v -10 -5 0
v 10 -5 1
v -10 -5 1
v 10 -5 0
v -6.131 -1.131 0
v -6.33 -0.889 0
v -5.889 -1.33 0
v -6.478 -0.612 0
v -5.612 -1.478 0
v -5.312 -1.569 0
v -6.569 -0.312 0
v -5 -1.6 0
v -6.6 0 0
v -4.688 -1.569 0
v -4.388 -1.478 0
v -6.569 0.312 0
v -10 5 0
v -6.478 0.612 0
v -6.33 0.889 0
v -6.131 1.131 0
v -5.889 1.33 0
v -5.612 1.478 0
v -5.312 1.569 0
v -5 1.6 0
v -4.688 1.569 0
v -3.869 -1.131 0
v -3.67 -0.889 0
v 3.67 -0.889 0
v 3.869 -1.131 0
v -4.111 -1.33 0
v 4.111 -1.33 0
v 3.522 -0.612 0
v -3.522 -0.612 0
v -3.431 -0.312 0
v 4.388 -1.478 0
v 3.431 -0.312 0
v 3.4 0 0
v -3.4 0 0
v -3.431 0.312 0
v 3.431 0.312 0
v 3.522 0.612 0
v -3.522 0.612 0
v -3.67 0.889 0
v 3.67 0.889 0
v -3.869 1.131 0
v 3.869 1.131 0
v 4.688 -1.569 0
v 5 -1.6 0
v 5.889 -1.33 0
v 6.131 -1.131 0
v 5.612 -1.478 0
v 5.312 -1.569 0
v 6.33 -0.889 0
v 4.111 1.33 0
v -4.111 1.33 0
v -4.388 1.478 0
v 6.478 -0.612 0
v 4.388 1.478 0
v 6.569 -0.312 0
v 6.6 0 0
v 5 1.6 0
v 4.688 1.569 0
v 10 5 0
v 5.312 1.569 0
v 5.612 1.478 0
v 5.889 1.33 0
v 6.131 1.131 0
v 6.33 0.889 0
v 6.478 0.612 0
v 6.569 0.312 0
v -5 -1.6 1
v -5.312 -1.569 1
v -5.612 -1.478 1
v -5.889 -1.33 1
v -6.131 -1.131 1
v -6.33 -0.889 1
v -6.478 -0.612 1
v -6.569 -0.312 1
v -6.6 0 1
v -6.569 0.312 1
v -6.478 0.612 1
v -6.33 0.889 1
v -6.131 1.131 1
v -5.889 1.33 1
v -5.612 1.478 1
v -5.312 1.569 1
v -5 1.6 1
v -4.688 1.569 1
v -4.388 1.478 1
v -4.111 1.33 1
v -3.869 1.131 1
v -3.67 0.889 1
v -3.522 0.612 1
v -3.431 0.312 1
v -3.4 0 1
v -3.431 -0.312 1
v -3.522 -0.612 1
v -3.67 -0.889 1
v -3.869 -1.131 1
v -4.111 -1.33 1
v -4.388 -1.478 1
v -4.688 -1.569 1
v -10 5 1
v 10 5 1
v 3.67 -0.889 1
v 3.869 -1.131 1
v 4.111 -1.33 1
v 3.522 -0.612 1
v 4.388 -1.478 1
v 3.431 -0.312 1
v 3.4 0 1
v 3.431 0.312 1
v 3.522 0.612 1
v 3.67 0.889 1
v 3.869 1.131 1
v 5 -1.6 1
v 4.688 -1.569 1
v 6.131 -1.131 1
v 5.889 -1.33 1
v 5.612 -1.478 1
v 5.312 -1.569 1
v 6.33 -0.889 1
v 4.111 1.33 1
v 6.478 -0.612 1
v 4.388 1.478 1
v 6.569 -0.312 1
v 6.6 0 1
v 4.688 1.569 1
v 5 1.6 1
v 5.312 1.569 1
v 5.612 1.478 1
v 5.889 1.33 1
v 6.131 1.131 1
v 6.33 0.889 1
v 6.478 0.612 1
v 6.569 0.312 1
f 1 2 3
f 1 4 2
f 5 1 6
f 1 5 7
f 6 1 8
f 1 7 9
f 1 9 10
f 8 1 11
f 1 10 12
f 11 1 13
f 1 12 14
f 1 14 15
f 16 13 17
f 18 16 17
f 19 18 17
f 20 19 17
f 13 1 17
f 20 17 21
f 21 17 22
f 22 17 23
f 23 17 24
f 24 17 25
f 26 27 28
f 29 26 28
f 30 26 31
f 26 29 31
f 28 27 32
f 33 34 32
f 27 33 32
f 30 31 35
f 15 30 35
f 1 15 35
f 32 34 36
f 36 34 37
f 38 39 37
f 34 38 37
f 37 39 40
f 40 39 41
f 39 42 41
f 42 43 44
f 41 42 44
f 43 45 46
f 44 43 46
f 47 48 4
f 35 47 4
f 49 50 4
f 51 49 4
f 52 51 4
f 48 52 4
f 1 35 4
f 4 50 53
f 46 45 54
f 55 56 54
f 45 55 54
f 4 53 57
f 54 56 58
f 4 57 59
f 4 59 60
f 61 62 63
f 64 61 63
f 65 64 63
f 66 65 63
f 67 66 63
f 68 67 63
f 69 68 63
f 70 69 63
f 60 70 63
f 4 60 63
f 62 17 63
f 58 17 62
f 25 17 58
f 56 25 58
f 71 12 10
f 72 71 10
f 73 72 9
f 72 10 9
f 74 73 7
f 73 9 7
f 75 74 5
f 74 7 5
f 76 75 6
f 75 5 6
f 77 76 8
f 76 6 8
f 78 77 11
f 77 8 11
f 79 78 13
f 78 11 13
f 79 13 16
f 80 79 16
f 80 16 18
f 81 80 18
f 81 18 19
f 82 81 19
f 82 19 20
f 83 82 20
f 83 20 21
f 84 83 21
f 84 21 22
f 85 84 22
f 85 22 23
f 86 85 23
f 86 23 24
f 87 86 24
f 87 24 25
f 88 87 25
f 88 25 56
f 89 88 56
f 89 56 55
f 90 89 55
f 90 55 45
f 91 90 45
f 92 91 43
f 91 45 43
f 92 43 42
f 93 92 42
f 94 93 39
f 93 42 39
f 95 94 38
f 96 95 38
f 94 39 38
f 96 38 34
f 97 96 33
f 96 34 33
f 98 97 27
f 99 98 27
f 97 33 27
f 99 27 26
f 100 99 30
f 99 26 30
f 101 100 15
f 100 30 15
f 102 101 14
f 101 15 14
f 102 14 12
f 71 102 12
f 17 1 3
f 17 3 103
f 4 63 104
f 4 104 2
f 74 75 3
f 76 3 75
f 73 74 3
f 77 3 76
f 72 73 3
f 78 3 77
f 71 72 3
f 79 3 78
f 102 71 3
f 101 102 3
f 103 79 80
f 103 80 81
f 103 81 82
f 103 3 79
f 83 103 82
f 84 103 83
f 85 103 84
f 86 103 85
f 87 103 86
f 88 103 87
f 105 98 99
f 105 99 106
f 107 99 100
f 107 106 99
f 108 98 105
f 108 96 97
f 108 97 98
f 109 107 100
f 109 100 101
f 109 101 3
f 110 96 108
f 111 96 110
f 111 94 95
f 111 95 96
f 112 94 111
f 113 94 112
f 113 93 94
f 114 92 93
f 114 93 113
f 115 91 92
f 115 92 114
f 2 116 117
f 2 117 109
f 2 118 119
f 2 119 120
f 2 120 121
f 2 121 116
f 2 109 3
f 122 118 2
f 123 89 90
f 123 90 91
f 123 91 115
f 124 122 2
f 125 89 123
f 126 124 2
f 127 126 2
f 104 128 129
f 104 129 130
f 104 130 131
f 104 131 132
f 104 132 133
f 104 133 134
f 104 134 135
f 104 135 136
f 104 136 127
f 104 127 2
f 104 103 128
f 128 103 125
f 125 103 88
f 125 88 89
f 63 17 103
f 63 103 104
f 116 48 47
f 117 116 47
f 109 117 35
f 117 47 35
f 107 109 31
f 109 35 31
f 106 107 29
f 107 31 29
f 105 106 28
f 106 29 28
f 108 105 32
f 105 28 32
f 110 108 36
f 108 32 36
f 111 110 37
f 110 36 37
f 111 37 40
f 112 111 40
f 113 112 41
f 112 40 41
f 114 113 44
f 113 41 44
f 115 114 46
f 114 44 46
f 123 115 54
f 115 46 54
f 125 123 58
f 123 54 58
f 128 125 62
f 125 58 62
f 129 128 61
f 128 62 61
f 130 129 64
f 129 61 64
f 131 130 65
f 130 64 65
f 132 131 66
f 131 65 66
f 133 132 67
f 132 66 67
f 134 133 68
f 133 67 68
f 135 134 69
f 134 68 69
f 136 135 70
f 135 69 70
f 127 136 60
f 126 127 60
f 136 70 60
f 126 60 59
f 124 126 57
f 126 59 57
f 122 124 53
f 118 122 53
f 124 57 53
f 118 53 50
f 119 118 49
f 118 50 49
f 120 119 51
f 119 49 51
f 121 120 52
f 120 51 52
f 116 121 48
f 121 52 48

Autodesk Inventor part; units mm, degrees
ref_plane "YZ Plane" through (0, 0, 0) normal (1, 0, 0) x (0, 1, 0)
ref_plane "XZ Plane" through (0, 0, 0) normal (0, 1, 0) x (-1, 0, 0)
ref_plane "XY Plane" through (0, 0, 0) normal (0, 0, 1) x (1, 0, 0)
sketch "スケッチ1" plane through (0, 0, 0) normal (0, 0, 1) x (1, 0, 0)
  line L0 (-10, 5) -> (10, 5)
  line L1 (10, 5) -> (10, -5)
  line L2 (10, -5) -> (-10, -5)
  line L3 (-10, -5) -> (-10, 5)
  line L4 (-10, 5) -> (10, -5) construction
  line L5 (10, 5) -> (-10, -5) construction
  point P0 (0, 0)
  dimension "d0" = 20
  dimension "d1" = 10
extrude "押し出し1" add sketch "スケッチ1" along normal blind 1
sketch "スケッチ2" plane through (0, 0, 1) normal (0, 0, 1) x (1, 0, 0)
  line L0 (10, -5) -> (10, 5) projected
  line L1 (10, 5) -> (-10, 5) projected
  line L2 (-10, 5) -> (-10, -5) projected
  point P0 (0, 0)
  point P1 (-5, 0)
  point P2 (5, 0)
  dimension "d4" = 5
  dimension "d5" = 5
  dimension "d6" = 5
  dimension "d7" = 5
hole "穴1" at (-5, 0, 1) at (5, 0, 1) direction (0, 0, -1) diameter 3.2 end through all
properties part number "爪_5" material "アルミニウム 6061"
